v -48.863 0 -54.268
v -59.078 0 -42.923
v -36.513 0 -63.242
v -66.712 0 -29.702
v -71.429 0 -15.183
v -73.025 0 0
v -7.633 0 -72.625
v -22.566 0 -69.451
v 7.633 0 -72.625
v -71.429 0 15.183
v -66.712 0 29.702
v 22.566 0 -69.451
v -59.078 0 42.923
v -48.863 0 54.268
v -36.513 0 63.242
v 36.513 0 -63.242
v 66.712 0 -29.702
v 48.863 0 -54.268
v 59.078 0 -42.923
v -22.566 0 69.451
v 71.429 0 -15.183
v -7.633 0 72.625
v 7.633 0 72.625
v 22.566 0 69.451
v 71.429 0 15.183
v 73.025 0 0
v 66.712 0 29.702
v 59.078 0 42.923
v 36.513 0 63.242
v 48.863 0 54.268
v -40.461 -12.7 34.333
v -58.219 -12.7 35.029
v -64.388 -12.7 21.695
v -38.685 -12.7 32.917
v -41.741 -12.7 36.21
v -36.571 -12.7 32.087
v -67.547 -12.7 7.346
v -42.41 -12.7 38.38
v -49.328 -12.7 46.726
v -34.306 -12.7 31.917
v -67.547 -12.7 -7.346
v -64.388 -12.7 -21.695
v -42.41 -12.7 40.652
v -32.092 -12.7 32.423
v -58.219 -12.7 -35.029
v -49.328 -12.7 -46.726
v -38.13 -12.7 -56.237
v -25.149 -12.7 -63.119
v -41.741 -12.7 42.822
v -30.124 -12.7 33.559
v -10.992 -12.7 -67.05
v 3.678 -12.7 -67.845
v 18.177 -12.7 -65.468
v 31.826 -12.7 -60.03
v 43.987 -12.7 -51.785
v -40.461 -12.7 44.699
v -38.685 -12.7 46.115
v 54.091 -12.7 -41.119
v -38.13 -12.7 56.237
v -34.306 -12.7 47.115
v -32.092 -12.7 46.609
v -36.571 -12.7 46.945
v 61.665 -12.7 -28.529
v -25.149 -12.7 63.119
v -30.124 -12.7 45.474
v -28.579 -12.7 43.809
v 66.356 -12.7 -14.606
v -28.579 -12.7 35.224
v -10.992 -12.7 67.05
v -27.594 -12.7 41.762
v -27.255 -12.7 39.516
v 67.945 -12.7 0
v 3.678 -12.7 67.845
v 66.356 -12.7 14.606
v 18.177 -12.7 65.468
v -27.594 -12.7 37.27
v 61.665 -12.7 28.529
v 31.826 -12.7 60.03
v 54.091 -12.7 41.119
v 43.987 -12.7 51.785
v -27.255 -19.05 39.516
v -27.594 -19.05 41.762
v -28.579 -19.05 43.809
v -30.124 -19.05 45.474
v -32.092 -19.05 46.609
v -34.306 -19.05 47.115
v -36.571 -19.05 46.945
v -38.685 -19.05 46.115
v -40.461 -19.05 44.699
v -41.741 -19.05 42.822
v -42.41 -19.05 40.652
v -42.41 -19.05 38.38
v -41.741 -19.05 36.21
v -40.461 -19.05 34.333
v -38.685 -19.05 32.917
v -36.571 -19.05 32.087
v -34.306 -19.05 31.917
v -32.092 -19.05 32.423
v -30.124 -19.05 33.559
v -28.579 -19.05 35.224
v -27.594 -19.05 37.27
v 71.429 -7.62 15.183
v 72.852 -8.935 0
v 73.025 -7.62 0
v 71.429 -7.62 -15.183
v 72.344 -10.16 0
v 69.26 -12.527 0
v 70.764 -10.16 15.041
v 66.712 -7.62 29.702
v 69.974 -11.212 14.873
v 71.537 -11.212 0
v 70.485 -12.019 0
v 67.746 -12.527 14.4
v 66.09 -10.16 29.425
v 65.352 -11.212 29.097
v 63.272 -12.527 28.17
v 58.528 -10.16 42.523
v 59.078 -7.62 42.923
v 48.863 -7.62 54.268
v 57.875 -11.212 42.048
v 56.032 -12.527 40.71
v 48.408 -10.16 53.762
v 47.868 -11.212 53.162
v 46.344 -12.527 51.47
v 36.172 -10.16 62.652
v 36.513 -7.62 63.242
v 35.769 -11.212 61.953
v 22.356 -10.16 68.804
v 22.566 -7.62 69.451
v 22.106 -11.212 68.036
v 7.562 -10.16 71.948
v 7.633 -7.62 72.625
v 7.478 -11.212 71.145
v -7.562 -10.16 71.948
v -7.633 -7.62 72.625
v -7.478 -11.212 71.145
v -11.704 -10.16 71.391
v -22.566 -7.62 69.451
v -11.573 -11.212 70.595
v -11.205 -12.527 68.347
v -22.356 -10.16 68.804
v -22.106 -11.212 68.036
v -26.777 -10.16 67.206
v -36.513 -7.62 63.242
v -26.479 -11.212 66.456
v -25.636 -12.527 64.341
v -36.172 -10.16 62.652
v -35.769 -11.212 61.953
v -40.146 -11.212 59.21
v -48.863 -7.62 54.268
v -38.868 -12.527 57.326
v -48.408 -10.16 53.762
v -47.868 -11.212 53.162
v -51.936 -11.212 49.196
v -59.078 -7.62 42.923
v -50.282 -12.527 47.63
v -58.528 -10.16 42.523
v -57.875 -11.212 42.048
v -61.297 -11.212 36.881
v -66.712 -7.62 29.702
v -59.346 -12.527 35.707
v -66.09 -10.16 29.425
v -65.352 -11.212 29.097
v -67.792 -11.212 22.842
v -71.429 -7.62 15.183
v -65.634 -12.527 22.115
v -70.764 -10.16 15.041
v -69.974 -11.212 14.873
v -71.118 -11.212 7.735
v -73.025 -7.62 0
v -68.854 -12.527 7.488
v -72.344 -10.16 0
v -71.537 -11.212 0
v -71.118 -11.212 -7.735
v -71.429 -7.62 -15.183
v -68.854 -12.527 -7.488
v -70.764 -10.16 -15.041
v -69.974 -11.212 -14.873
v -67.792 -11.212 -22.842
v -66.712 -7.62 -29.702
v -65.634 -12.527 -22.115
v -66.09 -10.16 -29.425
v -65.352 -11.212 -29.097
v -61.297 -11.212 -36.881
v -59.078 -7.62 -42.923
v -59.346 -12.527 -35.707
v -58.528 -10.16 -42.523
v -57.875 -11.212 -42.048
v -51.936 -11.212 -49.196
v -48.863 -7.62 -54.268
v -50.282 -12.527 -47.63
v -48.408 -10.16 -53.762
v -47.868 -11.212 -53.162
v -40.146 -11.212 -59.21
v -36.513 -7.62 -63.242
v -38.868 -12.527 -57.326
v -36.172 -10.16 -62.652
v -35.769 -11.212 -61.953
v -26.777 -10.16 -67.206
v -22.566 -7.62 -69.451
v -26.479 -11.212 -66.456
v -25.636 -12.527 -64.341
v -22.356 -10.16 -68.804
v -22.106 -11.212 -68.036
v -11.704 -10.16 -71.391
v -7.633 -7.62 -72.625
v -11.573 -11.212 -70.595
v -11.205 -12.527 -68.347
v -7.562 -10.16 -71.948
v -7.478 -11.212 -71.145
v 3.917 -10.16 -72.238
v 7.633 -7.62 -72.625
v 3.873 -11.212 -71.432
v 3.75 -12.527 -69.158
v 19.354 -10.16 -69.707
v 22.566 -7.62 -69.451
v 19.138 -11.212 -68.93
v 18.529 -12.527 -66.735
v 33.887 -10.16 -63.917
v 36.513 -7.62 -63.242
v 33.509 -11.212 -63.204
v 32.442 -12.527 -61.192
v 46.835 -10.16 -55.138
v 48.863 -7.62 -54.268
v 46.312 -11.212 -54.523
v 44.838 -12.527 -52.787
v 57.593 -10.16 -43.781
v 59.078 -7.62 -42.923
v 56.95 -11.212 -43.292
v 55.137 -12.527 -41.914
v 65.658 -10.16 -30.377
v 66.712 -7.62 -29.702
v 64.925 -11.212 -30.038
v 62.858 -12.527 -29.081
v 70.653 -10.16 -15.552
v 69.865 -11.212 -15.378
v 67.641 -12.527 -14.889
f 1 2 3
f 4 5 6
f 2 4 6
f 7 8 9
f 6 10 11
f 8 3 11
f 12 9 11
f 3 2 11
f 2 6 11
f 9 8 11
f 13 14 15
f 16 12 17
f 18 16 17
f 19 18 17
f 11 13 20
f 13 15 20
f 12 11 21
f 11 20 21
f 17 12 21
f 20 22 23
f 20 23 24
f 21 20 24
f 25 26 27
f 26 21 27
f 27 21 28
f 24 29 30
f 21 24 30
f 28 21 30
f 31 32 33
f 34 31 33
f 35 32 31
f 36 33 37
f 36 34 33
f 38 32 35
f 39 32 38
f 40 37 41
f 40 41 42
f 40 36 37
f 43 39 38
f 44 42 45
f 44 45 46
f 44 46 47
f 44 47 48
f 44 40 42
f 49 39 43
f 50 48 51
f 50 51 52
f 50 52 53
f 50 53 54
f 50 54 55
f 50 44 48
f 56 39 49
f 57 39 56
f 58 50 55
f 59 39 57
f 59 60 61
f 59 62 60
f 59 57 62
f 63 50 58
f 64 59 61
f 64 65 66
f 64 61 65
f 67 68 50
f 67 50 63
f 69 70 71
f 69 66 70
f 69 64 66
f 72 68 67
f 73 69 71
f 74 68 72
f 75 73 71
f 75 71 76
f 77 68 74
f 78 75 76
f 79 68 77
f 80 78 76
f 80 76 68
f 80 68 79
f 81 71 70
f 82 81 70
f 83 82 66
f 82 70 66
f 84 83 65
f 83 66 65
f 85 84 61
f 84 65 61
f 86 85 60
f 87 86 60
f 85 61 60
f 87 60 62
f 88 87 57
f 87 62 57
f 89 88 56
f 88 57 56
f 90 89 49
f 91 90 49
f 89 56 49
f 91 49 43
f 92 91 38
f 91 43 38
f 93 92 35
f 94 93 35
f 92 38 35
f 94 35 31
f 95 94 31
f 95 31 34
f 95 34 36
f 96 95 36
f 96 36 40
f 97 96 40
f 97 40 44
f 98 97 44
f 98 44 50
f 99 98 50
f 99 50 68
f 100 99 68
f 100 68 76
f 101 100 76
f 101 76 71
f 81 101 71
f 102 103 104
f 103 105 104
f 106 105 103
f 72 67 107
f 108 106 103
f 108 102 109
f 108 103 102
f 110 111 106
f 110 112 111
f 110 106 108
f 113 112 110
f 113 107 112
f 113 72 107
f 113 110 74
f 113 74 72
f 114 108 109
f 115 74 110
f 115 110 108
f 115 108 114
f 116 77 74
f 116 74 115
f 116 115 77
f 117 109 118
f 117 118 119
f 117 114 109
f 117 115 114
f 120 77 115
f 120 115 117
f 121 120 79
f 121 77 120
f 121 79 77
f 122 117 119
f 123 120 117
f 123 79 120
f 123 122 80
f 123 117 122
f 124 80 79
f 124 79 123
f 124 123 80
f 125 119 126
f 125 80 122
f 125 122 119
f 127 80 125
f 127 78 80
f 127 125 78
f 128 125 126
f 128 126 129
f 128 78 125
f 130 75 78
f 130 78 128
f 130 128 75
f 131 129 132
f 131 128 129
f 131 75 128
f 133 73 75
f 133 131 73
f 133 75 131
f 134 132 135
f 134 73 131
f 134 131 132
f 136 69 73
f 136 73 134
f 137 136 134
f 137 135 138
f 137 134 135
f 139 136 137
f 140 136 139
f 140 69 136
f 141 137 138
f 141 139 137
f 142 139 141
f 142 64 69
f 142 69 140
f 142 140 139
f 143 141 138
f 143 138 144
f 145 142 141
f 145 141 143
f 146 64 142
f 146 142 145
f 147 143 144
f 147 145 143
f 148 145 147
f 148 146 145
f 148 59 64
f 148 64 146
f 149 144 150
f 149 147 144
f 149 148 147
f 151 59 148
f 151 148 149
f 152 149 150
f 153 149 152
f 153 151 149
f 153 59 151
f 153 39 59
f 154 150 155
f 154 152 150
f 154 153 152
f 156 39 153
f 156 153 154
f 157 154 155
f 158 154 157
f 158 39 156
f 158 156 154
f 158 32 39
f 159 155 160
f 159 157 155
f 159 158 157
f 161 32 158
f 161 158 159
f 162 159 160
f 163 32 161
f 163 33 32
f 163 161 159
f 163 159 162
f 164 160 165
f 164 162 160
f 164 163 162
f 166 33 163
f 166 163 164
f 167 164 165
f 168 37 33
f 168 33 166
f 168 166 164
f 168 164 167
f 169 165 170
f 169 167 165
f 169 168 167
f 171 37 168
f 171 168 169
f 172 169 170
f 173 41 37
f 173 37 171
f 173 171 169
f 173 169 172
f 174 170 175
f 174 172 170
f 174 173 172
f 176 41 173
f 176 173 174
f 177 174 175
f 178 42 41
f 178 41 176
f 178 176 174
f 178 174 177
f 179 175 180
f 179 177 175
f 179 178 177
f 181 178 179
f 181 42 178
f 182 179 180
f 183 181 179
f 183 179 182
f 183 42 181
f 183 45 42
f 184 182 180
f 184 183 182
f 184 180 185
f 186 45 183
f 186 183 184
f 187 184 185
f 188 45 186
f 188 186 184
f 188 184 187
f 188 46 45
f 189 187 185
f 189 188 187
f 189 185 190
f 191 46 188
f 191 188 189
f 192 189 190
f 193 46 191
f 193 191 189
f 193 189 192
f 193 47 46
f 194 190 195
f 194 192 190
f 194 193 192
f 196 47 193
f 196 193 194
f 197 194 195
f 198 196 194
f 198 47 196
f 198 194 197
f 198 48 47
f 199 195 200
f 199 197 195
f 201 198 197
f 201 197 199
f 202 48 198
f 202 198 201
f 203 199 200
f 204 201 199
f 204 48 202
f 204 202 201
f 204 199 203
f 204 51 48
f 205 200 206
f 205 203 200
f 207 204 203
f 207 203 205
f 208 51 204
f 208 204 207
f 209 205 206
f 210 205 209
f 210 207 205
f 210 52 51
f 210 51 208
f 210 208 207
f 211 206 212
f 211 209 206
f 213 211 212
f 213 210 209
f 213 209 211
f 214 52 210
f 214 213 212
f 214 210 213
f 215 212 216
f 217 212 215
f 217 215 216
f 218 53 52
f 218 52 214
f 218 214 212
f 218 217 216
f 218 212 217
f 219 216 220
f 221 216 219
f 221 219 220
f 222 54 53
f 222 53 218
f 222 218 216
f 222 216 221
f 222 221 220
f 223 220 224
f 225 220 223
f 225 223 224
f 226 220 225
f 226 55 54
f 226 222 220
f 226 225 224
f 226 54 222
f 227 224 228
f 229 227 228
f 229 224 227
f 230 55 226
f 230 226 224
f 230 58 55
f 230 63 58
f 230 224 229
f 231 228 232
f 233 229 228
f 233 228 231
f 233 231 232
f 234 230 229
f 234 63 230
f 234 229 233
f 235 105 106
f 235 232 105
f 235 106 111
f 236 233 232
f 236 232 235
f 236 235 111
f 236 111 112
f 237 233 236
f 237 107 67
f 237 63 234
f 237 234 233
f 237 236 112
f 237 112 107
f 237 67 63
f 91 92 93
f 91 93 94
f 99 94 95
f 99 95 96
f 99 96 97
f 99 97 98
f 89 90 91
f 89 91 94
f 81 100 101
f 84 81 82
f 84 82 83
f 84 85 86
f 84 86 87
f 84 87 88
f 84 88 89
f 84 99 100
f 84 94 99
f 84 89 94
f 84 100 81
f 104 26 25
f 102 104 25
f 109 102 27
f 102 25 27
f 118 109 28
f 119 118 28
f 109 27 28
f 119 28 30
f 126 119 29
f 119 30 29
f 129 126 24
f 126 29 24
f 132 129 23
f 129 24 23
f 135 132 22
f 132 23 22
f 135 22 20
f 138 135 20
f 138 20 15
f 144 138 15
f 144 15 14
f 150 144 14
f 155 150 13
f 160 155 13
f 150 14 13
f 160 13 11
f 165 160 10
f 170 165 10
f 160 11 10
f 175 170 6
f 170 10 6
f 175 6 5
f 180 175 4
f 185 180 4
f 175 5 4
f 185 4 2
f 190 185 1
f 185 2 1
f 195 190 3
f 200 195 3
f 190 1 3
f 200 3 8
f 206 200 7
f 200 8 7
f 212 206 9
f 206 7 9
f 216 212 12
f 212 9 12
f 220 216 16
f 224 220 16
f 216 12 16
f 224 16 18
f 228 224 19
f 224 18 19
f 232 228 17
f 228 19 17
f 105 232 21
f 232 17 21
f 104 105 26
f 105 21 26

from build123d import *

# Parameters (mm, degrees)
F0_R     = 73.025
F0_R_2   = 7.62
F1_DEPTH = 12.7
F2_R     = 5.08
F3_DEPTH = 19.05


with BuildPart() as f1:
    # F0 (on Front) → F1 (new body)
    with BuildSketch(Plane.XZ):
        Circle(F0_R)
        with Locations((-34.87542, 39.516099)):
            Circle(F0_R_2, mode=Mode.SUBTRACT)
    extrude(amount=F1_DEPTH)

    # F2
    f2_edges = [f1.edges().sort_by_distance(p)[0] for p in [
        (-73.025, -12.7, 0),
    ]]
    fillet(f2_edges, radius=F2_R)

    # F0 (on Front) → F3 (join)
    with BuildSketch(Plane.XZ):
        with Locations((-34.87542, 39.516099)):
            Circle(F0_R_2)
    extrude(amount=F3_DEPTH)


solid = f1.part
